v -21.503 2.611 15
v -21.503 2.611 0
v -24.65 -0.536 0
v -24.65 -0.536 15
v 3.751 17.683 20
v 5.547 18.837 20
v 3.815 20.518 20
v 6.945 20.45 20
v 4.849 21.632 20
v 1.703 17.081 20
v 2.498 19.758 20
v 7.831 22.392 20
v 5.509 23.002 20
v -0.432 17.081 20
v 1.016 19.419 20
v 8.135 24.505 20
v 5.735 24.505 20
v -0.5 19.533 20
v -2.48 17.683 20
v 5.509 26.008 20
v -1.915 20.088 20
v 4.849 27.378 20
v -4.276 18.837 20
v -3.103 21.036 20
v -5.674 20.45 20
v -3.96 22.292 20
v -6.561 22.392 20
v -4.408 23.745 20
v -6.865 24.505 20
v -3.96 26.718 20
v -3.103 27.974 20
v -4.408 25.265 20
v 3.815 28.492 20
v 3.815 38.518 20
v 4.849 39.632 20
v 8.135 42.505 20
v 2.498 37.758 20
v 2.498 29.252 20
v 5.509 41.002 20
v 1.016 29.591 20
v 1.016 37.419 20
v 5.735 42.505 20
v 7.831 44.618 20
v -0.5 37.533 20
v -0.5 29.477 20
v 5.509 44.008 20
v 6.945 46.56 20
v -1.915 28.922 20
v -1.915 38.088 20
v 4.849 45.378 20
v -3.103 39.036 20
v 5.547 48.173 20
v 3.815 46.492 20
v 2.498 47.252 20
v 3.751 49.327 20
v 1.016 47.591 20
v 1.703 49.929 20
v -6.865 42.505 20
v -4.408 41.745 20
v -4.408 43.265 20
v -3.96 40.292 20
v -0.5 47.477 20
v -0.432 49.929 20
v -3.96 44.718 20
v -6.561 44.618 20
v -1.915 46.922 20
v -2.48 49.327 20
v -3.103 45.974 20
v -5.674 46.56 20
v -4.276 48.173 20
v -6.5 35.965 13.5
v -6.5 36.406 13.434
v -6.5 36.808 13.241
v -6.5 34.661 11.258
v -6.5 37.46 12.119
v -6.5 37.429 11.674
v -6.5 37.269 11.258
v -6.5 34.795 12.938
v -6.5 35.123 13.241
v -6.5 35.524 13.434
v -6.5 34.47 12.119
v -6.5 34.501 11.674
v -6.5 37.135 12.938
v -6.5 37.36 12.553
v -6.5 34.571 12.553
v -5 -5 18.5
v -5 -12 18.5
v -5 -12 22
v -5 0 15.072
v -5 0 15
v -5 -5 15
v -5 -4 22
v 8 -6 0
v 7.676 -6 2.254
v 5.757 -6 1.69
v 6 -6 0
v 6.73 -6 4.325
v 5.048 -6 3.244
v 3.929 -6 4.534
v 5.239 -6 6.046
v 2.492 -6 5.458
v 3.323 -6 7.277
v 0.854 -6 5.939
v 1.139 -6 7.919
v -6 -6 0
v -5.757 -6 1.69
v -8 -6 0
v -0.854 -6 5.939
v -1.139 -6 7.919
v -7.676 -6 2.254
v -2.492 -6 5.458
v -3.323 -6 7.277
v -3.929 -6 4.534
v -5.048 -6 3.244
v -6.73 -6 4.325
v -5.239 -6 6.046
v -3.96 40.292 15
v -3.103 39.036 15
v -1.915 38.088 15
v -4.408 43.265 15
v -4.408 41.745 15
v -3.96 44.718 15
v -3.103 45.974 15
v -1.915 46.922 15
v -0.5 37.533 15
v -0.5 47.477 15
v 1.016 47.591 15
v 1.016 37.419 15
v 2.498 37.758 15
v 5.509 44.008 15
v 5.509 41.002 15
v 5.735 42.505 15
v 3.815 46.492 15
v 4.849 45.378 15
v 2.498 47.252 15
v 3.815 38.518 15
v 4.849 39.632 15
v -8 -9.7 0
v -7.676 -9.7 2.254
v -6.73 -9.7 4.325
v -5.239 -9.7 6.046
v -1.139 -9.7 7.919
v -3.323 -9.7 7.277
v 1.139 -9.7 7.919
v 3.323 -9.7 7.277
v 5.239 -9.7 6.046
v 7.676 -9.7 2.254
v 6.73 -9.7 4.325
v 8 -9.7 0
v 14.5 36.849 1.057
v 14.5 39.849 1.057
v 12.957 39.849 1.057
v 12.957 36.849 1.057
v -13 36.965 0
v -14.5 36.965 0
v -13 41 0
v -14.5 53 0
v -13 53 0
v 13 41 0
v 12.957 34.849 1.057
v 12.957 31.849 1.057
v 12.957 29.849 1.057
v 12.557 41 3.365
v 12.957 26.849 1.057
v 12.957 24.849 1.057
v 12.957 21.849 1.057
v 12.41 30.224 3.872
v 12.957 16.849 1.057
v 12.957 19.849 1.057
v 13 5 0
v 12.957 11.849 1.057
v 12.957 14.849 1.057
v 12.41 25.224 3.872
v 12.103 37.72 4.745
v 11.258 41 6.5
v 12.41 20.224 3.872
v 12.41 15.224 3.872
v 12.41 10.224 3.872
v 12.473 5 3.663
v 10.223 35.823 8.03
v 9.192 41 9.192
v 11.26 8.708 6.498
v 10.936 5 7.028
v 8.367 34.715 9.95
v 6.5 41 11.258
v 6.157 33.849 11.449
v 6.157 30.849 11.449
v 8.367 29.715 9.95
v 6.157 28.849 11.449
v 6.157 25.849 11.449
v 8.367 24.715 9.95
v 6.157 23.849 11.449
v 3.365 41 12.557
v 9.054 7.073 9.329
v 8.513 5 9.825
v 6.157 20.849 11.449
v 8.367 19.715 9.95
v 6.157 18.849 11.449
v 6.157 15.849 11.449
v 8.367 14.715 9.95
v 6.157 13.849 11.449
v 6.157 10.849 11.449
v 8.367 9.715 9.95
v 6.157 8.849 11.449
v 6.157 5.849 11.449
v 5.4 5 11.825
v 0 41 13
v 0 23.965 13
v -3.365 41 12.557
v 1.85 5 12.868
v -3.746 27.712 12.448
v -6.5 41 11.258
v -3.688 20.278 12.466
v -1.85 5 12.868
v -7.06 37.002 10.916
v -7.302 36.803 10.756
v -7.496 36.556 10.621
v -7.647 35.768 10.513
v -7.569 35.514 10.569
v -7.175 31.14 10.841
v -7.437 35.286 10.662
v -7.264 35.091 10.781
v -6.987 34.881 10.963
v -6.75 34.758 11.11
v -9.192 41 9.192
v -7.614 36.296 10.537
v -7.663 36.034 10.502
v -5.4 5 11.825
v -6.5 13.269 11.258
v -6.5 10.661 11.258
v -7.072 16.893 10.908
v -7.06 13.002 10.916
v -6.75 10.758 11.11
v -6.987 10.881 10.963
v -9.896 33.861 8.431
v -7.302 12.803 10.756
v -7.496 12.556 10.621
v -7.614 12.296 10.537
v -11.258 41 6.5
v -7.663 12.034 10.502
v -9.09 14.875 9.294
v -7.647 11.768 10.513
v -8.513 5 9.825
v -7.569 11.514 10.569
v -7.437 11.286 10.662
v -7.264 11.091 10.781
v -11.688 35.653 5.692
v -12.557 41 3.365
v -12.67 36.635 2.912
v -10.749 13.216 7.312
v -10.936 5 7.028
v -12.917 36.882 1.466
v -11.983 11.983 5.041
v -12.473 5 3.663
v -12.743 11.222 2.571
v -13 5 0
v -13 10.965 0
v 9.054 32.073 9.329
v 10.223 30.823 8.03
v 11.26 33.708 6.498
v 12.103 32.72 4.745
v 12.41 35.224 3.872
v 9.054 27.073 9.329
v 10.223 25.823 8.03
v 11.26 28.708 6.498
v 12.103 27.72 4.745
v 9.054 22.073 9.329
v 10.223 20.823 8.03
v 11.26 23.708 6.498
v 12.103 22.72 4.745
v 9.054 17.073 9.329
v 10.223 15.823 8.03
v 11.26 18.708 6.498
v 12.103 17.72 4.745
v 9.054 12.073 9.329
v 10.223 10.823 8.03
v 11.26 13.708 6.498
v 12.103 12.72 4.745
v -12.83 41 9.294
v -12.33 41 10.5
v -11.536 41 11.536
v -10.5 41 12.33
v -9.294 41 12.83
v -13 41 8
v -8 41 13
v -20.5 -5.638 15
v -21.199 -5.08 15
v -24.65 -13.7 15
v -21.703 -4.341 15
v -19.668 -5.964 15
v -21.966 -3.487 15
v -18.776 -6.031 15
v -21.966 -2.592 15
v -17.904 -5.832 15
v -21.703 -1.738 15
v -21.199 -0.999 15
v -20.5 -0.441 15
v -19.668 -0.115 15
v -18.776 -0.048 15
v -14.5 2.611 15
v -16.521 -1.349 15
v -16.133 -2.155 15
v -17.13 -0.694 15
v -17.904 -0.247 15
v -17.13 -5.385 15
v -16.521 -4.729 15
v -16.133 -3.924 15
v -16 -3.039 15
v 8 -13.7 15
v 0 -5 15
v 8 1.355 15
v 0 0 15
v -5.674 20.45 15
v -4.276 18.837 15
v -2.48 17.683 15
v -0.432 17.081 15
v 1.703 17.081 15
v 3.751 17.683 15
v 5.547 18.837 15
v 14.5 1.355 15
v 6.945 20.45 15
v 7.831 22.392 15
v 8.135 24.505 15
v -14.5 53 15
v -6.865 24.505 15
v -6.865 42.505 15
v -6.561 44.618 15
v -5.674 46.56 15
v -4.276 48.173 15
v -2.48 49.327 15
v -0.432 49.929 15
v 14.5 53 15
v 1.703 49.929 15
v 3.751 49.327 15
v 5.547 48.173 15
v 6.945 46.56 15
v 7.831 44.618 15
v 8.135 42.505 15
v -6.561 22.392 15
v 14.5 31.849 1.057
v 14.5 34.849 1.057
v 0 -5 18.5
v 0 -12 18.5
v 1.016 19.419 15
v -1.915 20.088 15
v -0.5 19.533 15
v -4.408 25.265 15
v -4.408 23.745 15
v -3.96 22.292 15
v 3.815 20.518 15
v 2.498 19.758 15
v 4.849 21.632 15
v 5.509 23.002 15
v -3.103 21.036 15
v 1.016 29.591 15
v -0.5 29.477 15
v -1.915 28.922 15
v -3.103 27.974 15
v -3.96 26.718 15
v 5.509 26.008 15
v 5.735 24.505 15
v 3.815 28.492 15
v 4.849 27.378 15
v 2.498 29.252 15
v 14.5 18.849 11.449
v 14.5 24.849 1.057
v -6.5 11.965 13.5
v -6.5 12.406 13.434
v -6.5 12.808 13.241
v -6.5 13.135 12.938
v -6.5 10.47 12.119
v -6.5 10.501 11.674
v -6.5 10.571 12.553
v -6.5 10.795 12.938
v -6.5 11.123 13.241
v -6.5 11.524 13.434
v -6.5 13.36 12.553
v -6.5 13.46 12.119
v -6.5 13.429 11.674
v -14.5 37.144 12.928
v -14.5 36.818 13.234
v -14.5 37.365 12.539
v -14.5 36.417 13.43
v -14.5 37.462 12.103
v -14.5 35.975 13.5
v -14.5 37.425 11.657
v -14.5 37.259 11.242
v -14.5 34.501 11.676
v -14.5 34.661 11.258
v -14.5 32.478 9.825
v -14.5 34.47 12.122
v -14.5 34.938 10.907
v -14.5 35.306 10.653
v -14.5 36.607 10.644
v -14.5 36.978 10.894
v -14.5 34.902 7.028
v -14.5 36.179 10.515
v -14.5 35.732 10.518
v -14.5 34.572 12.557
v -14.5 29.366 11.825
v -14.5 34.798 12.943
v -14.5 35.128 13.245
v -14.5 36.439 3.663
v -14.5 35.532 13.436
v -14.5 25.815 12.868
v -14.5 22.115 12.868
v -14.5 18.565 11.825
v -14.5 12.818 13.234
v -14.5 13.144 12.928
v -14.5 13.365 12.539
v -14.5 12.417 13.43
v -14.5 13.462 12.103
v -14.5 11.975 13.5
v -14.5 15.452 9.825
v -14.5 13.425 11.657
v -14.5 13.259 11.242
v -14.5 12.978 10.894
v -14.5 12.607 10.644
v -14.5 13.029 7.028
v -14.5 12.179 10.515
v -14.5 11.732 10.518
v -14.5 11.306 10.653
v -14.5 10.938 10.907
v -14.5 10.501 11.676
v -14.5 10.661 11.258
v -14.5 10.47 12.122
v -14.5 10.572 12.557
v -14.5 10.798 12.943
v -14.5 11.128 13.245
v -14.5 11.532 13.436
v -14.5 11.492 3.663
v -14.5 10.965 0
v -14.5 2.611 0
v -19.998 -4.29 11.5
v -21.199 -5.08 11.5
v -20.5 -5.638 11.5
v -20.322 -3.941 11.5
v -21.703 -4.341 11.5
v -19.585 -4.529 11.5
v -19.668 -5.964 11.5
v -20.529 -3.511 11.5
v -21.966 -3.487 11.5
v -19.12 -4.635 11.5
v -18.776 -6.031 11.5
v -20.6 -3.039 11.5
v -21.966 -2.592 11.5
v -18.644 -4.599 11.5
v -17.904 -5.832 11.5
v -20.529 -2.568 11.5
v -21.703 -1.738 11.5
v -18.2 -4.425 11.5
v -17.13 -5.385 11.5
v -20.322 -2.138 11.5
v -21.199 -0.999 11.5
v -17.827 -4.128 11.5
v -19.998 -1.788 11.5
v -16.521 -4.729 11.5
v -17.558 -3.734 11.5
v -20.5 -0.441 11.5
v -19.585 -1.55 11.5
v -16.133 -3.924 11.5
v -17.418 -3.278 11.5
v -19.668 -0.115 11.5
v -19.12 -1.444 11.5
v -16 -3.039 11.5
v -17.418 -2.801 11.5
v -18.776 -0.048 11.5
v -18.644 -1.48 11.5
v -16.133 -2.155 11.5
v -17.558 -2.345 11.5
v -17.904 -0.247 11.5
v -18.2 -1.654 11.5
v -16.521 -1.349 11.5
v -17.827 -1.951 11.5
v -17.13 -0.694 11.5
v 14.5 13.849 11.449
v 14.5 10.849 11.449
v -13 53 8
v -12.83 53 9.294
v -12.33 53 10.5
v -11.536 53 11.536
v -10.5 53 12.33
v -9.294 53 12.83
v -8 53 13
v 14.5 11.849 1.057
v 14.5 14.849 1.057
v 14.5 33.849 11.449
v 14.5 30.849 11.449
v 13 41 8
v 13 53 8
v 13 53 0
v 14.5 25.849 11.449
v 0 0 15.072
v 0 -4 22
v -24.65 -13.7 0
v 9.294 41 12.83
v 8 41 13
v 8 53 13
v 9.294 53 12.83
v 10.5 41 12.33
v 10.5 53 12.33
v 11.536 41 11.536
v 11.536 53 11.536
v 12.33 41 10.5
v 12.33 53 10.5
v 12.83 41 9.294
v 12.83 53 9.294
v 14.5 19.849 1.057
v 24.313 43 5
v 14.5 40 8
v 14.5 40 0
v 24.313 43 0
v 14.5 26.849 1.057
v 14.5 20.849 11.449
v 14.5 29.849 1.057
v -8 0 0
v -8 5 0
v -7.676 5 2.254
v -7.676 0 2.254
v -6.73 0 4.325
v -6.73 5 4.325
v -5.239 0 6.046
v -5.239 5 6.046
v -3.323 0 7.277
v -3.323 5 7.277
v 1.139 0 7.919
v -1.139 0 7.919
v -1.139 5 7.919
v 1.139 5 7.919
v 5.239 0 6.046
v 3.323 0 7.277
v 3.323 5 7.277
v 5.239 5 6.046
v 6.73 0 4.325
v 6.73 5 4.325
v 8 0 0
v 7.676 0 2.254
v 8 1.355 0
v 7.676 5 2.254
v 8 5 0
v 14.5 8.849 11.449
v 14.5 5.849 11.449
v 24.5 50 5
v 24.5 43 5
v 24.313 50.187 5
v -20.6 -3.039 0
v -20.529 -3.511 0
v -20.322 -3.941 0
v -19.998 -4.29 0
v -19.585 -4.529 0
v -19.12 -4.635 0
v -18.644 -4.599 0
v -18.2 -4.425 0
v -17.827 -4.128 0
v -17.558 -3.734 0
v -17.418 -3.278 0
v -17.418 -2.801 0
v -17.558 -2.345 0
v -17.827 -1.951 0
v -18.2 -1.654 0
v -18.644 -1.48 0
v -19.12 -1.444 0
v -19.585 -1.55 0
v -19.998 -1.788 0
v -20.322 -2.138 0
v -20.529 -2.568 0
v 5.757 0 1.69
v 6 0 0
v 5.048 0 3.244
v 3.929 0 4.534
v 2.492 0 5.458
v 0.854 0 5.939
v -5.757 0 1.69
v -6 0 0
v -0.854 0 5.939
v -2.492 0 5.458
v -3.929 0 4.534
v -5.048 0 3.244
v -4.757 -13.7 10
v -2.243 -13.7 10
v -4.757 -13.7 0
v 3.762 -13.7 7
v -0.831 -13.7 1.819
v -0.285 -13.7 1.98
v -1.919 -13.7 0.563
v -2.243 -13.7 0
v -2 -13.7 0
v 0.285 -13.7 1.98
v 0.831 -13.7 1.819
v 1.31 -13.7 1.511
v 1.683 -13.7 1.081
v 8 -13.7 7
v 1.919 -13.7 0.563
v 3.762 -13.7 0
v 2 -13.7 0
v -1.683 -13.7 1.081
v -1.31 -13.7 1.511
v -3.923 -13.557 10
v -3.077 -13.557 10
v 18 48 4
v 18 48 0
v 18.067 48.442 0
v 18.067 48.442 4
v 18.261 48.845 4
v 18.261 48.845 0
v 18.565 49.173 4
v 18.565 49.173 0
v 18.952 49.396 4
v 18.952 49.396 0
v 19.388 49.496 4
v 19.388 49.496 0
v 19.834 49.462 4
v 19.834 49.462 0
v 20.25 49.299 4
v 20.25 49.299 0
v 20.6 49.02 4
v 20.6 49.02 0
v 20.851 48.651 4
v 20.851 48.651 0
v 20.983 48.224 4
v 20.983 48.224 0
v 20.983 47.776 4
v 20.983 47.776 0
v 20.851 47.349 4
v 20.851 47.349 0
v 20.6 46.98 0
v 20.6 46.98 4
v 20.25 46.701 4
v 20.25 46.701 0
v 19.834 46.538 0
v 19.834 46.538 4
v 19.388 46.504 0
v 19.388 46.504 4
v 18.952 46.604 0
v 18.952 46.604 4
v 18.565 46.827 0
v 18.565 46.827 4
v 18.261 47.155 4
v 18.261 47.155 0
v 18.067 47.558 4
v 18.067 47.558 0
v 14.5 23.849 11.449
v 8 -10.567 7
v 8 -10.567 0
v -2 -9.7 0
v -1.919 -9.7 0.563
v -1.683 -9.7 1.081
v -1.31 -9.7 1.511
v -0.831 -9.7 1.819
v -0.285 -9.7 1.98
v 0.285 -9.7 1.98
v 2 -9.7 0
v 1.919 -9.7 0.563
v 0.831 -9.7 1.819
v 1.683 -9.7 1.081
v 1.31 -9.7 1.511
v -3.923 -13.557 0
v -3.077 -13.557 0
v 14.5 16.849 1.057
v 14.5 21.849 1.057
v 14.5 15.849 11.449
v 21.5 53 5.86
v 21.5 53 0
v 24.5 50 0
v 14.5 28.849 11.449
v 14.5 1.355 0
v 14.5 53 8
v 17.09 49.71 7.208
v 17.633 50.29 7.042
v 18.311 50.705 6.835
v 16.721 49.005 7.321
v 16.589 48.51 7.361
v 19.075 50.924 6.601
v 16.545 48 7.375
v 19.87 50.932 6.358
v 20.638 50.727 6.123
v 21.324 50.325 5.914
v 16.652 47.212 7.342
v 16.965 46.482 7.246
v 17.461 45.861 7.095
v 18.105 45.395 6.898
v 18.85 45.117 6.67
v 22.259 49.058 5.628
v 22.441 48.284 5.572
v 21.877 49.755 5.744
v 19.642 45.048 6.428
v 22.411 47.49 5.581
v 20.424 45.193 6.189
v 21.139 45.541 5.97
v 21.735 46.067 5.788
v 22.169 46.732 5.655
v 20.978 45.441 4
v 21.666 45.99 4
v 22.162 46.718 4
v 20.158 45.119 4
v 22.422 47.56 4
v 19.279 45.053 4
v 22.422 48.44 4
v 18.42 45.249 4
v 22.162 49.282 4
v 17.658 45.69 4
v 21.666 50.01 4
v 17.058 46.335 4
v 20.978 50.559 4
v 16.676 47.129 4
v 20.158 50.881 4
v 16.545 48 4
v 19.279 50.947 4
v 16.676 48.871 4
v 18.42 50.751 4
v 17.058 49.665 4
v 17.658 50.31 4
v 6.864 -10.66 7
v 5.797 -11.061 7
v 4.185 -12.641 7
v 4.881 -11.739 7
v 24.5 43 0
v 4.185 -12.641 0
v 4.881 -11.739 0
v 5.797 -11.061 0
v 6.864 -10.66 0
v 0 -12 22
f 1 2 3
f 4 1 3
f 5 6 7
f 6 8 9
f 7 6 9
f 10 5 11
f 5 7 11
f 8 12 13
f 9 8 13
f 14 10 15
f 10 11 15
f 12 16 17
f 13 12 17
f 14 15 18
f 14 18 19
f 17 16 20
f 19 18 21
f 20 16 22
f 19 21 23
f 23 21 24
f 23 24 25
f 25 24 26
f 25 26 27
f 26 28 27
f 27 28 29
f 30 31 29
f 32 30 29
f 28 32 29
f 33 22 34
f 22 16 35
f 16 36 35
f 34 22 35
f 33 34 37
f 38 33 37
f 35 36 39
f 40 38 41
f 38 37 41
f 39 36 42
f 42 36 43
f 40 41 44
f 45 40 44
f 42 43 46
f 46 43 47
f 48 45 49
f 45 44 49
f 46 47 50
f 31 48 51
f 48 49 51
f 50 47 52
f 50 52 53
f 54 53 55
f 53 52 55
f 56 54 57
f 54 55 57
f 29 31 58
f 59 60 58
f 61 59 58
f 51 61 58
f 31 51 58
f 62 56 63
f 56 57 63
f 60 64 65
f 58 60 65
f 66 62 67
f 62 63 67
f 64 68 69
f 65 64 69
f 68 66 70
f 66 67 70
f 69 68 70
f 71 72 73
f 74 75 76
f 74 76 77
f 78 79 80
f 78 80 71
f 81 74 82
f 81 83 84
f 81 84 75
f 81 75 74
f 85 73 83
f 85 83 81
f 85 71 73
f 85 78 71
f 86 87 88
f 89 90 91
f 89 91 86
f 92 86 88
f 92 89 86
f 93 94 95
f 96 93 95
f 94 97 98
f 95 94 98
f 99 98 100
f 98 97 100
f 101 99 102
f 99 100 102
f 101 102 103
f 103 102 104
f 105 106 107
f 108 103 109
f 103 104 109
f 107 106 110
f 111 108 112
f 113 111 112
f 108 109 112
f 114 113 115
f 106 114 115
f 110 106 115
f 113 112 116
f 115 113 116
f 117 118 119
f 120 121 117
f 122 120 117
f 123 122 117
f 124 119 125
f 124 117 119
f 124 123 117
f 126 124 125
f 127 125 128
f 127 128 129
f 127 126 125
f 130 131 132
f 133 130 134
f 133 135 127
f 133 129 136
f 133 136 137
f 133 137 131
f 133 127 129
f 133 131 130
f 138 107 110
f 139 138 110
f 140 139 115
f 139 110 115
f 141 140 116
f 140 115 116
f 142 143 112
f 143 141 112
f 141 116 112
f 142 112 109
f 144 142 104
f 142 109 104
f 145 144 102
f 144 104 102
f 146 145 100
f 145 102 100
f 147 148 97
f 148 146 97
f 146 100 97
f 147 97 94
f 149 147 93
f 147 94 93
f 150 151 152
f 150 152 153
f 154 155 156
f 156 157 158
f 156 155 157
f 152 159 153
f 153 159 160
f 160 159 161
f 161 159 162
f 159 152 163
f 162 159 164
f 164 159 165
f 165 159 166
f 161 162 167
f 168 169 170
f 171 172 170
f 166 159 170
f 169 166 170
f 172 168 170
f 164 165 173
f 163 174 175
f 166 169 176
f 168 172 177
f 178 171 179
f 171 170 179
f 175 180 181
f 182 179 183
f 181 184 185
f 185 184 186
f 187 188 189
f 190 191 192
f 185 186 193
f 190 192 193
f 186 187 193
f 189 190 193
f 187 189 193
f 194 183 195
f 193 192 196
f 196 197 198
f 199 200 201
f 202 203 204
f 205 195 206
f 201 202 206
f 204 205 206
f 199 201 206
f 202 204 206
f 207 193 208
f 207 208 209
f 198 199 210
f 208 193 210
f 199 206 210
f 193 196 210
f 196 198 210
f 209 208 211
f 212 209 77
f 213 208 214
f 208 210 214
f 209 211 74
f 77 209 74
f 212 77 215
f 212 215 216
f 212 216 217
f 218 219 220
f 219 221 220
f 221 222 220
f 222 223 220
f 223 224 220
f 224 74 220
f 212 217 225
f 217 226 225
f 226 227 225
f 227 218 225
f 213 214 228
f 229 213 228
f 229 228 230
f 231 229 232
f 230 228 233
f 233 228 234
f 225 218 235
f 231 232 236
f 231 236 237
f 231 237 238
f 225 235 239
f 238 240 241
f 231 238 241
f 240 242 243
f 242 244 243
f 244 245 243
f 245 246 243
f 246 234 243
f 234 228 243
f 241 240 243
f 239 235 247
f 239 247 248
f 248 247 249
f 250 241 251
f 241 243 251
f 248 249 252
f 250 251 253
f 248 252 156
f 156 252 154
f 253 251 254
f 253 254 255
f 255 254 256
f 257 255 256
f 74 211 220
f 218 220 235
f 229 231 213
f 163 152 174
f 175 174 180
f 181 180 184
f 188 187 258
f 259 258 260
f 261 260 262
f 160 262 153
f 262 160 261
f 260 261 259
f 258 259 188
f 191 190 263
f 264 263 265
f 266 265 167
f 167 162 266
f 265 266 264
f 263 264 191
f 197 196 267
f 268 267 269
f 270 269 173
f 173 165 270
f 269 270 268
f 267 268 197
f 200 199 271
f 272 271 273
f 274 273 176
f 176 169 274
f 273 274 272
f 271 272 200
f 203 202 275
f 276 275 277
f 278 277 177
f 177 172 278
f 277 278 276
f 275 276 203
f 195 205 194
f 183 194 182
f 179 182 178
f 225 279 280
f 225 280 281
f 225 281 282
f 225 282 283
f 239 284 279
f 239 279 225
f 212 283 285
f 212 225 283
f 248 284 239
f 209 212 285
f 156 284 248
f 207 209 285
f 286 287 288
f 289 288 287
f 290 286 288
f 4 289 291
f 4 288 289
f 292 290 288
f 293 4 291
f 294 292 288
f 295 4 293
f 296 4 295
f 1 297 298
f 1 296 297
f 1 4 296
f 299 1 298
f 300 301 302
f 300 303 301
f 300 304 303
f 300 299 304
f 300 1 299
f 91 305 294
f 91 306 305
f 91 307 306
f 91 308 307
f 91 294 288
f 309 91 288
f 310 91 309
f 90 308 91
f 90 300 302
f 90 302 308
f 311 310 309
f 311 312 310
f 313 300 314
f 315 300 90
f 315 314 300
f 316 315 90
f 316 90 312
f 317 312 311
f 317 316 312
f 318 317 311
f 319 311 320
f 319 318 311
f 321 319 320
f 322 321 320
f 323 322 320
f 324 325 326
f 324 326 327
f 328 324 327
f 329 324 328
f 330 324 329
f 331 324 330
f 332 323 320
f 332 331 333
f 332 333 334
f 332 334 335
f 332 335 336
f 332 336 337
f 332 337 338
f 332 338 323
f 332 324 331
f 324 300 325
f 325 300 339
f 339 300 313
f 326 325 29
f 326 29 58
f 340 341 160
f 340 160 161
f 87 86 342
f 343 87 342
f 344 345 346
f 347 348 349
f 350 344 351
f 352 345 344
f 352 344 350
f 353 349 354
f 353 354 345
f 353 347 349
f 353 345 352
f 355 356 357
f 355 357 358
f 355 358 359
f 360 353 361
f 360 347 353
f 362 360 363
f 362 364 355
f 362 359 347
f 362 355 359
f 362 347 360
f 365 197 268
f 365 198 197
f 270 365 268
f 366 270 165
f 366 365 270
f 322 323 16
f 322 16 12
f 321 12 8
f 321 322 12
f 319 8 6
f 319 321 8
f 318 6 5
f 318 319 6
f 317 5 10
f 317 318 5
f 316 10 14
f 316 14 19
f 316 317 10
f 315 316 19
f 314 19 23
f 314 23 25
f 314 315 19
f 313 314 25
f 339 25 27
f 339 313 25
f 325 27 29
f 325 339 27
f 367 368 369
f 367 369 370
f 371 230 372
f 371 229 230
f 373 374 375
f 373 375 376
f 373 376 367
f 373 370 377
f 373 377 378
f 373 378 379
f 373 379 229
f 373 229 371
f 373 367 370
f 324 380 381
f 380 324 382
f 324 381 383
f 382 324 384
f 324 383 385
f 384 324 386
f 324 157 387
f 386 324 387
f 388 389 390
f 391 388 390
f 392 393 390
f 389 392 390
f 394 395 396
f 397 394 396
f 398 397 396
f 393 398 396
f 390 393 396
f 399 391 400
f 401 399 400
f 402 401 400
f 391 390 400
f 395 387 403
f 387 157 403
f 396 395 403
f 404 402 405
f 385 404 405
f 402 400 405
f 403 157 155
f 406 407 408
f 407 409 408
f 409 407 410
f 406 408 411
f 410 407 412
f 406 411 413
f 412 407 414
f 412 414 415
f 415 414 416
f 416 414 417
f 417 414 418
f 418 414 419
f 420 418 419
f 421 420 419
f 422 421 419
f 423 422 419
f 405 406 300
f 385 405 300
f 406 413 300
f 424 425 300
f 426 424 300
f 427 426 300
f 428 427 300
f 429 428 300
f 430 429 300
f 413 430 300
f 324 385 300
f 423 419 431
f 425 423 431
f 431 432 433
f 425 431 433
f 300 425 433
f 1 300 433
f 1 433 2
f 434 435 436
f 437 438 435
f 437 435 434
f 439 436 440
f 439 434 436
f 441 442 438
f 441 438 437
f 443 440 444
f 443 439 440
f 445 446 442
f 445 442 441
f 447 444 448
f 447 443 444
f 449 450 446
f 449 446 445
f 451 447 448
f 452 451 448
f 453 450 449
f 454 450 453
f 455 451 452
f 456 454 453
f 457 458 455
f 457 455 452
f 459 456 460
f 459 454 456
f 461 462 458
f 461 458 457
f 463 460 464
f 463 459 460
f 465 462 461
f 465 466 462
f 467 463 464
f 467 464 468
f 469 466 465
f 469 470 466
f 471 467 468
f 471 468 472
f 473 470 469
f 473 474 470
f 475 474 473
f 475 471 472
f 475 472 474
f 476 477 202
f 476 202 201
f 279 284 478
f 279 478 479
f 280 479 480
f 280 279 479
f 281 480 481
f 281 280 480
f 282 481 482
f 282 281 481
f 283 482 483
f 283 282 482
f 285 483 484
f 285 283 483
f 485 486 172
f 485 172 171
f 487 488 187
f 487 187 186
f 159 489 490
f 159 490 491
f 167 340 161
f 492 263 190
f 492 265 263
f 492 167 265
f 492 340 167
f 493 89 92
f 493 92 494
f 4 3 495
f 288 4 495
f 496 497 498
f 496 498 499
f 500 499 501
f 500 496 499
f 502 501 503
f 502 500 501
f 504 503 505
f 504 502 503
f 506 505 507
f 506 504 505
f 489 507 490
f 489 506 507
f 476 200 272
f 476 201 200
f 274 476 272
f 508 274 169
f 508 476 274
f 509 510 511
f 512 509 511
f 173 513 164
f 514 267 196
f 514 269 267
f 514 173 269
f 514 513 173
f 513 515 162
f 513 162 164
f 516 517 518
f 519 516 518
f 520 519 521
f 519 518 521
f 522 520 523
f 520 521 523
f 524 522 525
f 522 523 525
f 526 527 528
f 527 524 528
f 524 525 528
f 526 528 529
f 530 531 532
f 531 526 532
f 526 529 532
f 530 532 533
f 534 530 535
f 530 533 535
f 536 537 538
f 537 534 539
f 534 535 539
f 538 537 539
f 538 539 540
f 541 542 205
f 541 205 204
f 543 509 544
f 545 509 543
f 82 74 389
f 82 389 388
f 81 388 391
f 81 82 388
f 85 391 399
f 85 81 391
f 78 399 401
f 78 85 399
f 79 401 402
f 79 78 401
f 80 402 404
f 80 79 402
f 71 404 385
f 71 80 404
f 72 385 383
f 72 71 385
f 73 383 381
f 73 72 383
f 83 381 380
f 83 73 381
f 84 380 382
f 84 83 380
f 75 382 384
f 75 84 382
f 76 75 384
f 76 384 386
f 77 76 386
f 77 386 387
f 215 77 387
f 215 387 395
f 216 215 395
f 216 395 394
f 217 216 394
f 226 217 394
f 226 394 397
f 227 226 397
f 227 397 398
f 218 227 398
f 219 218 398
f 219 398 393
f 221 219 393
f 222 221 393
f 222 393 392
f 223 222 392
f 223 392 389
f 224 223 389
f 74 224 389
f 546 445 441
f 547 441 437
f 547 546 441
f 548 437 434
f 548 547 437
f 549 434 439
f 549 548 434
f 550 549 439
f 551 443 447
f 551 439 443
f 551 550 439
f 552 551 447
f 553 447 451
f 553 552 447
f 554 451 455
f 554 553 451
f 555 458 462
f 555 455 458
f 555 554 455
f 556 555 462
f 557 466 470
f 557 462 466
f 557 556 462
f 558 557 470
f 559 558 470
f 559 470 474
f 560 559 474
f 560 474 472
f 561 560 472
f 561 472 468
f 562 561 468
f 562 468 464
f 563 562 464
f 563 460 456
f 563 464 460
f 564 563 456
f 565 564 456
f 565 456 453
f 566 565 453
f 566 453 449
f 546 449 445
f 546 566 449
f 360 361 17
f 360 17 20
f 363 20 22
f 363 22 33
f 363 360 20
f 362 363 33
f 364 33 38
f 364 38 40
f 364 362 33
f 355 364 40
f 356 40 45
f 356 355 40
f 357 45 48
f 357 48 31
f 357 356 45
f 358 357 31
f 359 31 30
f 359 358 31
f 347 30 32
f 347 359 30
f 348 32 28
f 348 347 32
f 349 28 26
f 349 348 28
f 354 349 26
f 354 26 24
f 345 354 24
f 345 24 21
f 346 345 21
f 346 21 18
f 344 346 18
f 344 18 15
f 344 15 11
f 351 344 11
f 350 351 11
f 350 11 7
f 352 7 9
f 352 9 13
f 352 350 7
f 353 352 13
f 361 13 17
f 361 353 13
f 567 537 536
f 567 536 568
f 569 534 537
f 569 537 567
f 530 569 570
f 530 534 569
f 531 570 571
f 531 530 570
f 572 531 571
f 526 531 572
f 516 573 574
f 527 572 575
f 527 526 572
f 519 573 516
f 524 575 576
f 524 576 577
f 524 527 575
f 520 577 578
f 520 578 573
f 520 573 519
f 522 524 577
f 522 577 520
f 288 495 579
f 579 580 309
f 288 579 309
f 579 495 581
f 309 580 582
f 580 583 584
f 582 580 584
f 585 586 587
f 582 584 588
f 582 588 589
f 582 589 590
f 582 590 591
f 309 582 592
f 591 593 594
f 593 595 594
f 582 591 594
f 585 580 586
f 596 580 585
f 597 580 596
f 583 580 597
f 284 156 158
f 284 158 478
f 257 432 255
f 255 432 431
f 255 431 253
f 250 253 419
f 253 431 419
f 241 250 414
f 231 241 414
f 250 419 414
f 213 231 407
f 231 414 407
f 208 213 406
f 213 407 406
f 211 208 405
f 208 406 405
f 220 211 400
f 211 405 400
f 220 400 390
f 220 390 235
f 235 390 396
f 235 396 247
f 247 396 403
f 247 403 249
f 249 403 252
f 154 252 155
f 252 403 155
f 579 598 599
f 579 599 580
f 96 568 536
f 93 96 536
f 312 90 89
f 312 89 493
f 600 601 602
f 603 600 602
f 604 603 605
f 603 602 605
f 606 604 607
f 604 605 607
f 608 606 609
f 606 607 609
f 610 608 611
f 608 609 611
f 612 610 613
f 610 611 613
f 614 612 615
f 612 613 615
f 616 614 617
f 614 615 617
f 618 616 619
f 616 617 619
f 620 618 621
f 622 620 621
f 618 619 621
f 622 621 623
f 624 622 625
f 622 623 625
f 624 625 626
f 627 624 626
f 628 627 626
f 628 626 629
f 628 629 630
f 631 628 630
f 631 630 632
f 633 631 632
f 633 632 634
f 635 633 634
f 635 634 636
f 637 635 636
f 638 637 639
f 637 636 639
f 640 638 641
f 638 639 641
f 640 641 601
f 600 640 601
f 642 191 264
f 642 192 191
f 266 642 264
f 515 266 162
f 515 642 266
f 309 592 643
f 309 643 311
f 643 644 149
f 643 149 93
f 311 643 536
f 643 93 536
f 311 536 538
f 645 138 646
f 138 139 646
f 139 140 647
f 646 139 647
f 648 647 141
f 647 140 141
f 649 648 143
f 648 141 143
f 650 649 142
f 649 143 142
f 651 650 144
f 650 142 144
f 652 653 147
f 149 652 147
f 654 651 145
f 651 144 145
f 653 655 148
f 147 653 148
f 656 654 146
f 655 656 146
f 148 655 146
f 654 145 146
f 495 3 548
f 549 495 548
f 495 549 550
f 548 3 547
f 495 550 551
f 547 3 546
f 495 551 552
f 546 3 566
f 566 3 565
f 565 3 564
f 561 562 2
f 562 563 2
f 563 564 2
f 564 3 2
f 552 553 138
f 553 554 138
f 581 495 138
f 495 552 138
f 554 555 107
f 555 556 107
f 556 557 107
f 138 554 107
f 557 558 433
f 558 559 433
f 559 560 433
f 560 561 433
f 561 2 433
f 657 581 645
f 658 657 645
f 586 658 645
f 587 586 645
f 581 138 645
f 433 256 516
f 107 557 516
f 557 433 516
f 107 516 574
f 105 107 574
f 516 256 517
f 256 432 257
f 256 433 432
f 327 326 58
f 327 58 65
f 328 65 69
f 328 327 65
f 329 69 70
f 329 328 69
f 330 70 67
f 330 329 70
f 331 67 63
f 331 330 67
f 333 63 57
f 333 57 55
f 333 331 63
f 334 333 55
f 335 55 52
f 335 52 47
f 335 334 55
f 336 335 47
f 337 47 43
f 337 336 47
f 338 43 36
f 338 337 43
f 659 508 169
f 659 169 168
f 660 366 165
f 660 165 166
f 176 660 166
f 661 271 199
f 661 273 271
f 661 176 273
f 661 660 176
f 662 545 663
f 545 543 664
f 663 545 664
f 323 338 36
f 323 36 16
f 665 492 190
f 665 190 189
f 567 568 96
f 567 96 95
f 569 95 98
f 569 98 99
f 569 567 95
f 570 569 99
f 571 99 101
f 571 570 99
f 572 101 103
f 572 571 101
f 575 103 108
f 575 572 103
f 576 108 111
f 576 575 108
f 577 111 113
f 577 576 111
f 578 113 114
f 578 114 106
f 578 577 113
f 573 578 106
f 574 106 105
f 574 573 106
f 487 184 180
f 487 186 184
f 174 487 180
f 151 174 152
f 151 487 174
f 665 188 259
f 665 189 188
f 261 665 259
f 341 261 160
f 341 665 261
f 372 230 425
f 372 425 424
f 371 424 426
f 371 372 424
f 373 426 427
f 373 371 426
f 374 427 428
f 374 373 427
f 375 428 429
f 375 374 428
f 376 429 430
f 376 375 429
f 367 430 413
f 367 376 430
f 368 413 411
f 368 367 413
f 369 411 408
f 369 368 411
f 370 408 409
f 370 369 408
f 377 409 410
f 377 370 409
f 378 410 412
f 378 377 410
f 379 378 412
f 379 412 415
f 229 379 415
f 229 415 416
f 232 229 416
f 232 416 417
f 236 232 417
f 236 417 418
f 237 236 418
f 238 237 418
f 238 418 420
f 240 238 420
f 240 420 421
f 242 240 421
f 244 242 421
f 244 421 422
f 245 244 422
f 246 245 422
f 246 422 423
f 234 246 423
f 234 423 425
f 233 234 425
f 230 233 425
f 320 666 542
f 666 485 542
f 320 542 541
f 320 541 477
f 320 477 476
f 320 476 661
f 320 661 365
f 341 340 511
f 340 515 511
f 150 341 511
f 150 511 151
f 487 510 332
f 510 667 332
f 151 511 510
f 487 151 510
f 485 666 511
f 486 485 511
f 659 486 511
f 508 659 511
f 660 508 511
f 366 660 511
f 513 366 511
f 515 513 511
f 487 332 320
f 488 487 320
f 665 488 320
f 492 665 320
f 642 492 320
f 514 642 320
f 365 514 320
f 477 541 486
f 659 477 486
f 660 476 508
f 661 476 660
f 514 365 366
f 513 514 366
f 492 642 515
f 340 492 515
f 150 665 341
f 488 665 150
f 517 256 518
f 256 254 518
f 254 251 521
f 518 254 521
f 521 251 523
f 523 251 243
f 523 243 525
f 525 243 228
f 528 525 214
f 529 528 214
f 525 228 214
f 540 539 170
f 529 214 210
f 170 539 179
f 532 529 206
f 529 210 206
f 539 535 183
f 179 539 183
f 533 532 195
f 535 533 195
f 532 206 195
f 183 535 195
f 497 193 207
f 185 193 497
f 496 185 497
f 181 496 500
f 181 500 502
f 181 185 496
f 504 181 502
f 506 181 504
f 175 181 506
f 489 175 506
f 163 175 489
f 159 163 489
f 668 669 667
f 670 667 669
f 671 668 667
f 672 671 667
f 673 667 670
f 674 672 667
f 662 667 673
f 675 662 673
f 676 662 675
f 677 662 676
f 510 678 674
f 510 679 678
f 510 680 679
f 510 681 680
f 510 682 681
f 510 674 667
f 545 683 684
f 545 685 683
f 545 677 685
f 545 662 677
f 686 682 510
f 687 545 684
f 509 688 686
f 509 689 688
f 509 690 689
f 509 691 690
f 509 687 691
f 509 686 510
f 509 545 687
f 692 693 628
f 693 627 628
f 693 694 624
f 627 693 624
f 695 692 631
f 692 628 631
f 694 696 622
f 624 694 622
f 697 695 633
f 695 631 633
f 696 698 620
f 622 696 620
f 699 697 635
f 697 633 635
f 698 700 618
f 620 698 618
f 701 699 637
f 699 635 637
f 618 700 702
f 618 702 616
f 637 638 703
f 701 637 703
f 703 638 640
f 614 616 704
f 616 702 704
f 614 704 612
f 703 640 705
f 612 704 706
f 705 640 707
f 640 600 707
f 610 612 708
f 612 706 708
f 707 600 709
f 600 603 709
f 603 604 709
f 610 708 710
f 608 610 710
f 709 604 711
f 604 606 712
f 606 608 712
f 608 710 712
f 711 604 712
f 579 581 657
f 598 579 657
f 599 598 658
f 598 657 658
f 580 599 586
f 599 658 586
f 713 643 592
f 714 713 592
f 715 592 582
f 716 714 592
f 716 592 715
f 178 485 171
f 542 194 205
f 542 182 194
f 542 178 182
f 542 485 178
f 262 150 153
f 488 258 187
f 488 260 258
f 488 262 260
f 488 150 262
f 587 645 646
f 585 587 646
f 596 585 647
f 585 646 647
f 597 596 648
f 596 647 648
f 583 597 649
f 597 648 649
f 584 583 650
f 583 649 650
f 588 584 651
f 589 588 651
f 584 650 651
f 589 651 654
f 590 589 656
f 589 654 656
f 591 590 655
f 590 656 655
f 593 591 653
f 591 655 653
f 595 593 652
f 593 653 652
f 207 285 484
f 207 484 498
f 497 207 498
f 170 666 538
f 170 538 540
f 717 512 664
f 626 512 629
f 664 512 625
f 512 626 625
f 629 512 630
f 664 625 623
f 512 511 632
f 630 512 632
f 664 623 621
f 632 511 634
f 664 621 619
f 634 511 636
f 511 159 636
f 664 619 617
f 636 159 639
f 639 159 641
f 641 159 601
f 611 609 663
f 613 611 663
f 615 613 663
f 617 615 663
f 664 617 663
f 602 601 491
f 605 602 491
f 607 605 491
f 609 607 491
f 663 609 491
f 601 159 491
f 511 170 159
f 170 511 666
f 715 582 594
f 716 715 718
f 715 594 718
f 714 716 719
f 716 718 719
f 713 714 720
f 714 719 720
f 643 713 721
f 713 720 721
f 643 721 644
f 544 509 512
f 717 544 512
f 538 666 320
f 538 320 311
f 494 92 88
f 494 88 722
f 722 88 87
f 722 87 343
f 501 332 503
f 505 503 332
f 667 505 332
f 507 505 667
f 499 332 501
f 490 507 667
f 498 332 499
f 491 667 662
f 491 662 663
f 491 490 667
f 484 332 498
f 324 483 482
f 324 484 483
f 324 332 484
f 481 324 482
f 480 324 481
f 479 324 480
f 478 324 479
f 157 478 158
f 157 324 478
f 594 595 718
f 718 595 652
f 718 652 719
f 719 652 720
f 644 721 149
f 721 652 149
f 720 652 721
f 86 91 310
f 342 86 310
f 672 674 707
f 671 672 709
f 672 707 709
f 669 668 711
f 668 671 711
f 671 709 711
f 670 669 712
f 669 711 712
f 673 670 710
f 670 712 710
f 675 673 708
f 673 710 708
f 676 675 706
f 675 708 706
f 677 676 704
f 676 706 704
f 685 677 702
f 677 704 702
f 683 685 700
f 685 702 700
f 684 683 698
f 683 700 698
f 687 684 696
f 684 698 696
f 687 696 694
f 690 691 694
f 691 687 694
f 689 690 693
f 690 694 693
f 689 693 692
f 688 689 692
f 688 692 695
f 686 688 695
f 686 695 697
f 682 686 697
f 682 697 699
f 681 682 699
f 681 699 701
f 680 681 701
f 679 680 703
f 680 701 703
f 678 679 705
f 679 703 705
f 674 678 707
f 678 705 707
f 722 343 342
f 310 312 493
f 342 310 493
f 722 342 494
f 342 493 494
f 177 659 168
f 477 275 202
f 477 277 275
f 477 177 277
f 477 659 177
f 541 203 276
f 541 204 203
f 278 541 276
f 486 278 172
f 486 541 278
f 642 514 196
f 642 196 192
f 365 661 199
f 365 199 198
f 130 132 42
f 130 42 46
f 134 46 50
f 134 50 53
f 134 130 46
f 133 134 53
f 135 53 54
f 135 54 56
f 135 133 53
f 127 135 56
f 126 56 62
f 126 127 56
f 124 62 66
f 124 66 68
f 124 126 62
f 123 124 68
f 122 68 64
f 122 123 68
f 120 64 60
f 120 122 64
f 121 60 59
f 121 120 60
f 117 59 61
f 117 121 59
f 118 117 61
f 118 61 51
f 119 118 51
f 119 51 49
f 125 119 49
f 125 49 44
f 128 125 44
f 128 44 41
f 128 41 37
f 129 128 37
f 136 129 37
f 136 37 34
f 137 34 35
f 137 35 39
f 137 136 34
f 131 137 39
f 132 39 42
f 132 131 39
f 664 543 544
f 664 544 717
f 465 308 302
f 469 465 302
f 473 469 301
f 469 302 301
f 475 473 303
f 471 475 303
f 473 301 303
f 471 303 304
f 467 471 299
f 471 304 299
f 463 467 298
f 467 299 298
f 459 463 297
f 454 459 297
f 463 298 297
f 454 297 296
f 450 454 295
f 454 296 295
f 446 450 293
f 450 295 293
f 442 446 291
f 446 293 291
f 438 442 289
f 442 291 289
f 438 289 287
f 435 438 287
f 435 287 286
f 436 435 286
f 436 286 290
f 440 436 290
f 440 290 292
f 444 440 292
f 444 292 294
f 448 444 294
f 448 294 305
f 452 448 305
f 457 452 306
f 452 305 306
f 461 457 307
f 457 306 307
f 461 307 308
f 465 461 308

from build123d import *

# Parameters (mm, degrees)
P_IDAT_VYSUNUT_M1_DEPTH       = 6
P_IDAT_VYSUNUT_M2_DEPTH       = 4
P_IDAT_START                  = -18.7
P_IDAT_VYSUNUT_M3_DEPTH       = 18.7
P_IDAT_VYSUNUT_M4_DEPTH       = 36
P_IDAT_VYSUNUT_M5_DEPTH       = 12
P_IDAT_VYSUNUT_M6_DEPTH       = 18.7
SKICA10_W                     = 6.5
SKICA10_H                     = 16.04047294
ODEBRAT_VYSUNUT_M2_DEPTH      = 15
SKICA4_R                      = 4.125470306
ODEBRAT_VYSUNUT_M3_DEPTH      = 7
SKICA11_R                     = 1.6
P_IDAT_VYSUNUT_M7_DEPTH       = 15
SKICA12_R                     = 5
ODEBRAT_VYSUNUT_M4_DEPTH      = 10
SKICA13_R                     = 3
ODEBRAT_VYSUNUT_M5_DEPTH      = 3.5
ODEBRAT_VYSUNUT_M6_REACH      = 69.578
ODEBRAT_VYSUNUT_M6_END_RADIUS = 13
ODEBRAT_START                 = -8
SKICA15_R                     = 1.5
ODEBRAT_VYSUNUT_M7_DEPTH      = 8
ODEBRAT_VYSUNUT_M8_REACH      = 64.249
ODEBRAT_VYSUNUT_M8_END_RADIUS = 13
SKICA16_R                     = 13
SKICA17_W                     = 5
SKICA17_H                     = 10
P_IDAT_VYSUNUT_M8_DEPTH       = 10
ZKOSEN_1_SIZE                 = 3
ZKOSEN_1_SIZE2                = 9.812557855
ZKOSEN_2_SIZE                 = 3
ZKOSEN_2_SIZE2                = 9.812557855
SKICA18_R                     = 1.5
ODEBRAT_VYSUNUT_M9_DEPTH      = 4
SKICA19_R                     = 2.955100019
ODEBRAT_VYSUNUT_M10_DEPTH     = 4
ZKOSEN_3_SIZE                 = 3
SKICA20_W                     = 5
SKICA20_H                     = 5
P_IDAT_VYSUNUT_M9_DEPTH       = 7
SKICA21_W                     = 5
SKICA21_H                     = 3.5
P_IDAT_VYSUNUT_M10_DEPTH      = 7
ZKOSEN_4_SIZE                 = 4
ZKOSEN_4_SIZE2                = 6.92820323
SKICA22_R                     = 5.1
P_IDAT_VYSUNUT_M11_DEPTH      = 5


with BuildPart() as part:
    # Skica2 → Přidat vysunutím1 (new body)
    with BuildSketch(Plane.XZ):
        with BuildLine():
            Line((8, 0), (6, 0))
            ThreePointArc((6, 0), (0, 6), (-6, 0))
            Line((-6, 0), (-8, 0))
            ThreePointArc((-8, 0), (0, 8), (8, 0))
        make_face()
    extrude(amount=P_IDAT_VYSUNUT_M1_DEPTH)



with BuildPart() as body_2:
    # Skica3 → Přidat vysunutím2 (new body)
    with BuildSketch(Plane.XZ.offset(9.7)):
        with BuildLine():
            Line((4.5, 0), (8, 0))
            ThreePointArc((8, 0), (0, 8), (-8, 0))
            Line((-8, 0), (-4.5, 0))
            Line((-4.5, 0), (-2, 0))
            ThreePointArc((-2, 0), (0, 2), (2, 0))
            Line((2, 0), (4.5, 0))
        make_face()
    extrude(amount=P_IDAT_VYSUNUT_M2_DEPTH)


with BuildPart() as part_1:
    add(part.part)

    add(body_2.part)  # Přidat vysunutím3 merges body 2
    # Skica6 → Přidat vysunutím3 (add)
    with BuildSketch(Plane.XZ.offset(13.7).offset(P_IDAT_START)):
        with BuildLine():
            Line((-13, 0), (-8, 0))
            ThreePointArc((-8, 0), (0, 8), (8, 0))
            Line((8, 0), (13, 0))
            ThreePointArc((13, 0), (0, 13), (-13, 0))
        make_face()
    extrude(amount=P_IDAT_VYSUNUT_M3_DEPTH)



with BuildPart() as body_2_2:
    # Skica7 → Přidat vysunutím4 (new body)
    with BuildSketch(Plane(origin=(0, 5, 0), x_dir=(1, 0, 0), z_dir=(0, 1, 0))):
        with BuildLine():
            Line((-13, 0), (-14.5, 0))
            Line((-14.5, 0), (-14.5, -15))
            Line((-14.5, -15), (14.5, -15))
            Line((14.5, -15), (14.5, 0))
            Line((14.5, 0), (13, 0))
            ThreePointArc((13, 0), (0, -13), (-13, 0))
        make_face()
    extrude(amount=P_IDAT_VYSUNUT_M4_DEPTH)

    # Skica8 → Přidat vysunutím5 (add)
    with BuildSketch(Plane(origin=(0, 41, 0), x_dir=(1, 0, 0), z_dir=(0, 1, 0))):
        with BuildLine():
            Line((-14.5, 0), (-13, 0))
            Line((-13, 0), (-13, -8))
            ThreePointArc((-13, -8), (-11.535533906, -11.535533906), (-8, -13))
            Line((-8, -13), (8, -13))
            ThreePointArc((8, -13), (11.535533906, -11.535533906), (13, -8))
            Line((13, -8), (13, 0))
            Line((13, 0), (14.5, 0))
            Line((14.5, 0), (14.5, -15))
            Line((14.5, -15), (-14.5, -15))
            Line((-14.5, -15), (-14.5, 0))
        make_face()
    extrude(amount=P_IDAT_VYSUNUT_M5_DEPTH)


with BuildPart() as part_2:
    add(part_1.part)

    add(body_2_2.part)  # Přidat vysunutím6 merges body 2 2
    # Skica9 → Přidat vysunutím6 (add)
    with BuildSketch(Plane.XZ.offset(-5)):
        with BuildLine():
            Line((13, 0), (14.5, 0))
            Line((14.5, 0), (14.5, 15))
            Line((14.5, 15), (-14.5, 15))
            Line((-14.5, 15), (-14.5, 0))
            Line((-14.5, 0), (-13, 0))
            ThreePointArc((-13, 0), (0, 13), (13, 0))
        make_face()
    extrude(amount=P_IDAT_VYSUNUT_M6_DEPTH)

    # Skica10 → Odebrat vysunutím2 (cut)
    with BuildSketch(Plane(origin=(0, 0, 0), x_dir=(-1, 0, 0), z_dir=(0, 0, -1))):
        with Locations((-11.25, -6.665379435)):
            Rectangle(SKICA10_W, SKICA10_H)
    extrude(amount=-ODEBRAT_VYSUNUT_M2_DEPTH, mode=Mode.SUBTRACT)

    # Skica4 → Odebrat vysunutím3 (cut)
    with BuildSketch(Plane(origin=(0, 0, 0), x_dir=(-1, 0, 0), z_dir=(0, 0, -1))):
        with Locations((-7.768024839, -14.685615905)):
            Circle(SKICA4_R)
    extrude(amount=-ODEBRAT_VYSUNUT_M3_DEPTH, mode=Mode.SUBTRACT)

    # Skica11 → Přidat vysunutím7 (add)
    with BuildSketch(Plane.XY):
        with BuildLine():
            Line((-24.65, -13.7), (-14.5, -13.7))
            Line((-14.5, -13.7), (-4.756948598, -13.7))
            ThreePointArc((-4.756948598, -13.7), (-3.5, -13.539429741), (-2.243051402, -13.7))
            Line((-2.243051402, -13.7), (-2, -13.7))
            Line((-2, -13.7), (-2, -9.7))
            Line((-2, -9.7), (-8, -9.7))
            Line((-8, -9.7), (-8, -6))
            Line((-8, -6), (-6, -6))
            Line((-6, -6), (-6, 0))
            Line((-6, 0), (-8, 0))
            Line((-8, 0), (-8, 5))
            Line((-8, 5), (-13, 5))
            Line((-13, 5), (-13, 10.965216354))
            Line((-13, 10.965216354), (-14.5, 10.965216354))
            Line((-14.5, 10.965216354), (-14.5, 2.610570259))
            Line((-14.5, 2.610570259), (-21.503374824, 2.610570259))
            Line((-21.503374824, 2.610570259), (-24.65, -0.536054918))
            Line((-24.65, -0.536054918), (-24.65, -13.7))
        make_face()
        with Locations(Location((-19, -3.039429741, 0), (0, 0, 180))):
            Circle(SKICA11_R, mode=Mode.SUBTRACT)
    extrude(amount=P_IDAT_VYSUNUT_M7_DEPTH)

    # Skica12 → Odebrat vysunutím4 (cut)
    with BuildSketch(Plane(origin=(0, 0, 0), x_dir=(-1, 0, 0), z_dir=(0, 0, -1))):
        with Locations((3.5, -18.539429741)):
            Circle(SKICA12_R)
    extrude(amount=-ODEBRAT_VYSUNUT_M4_DEPTH, mode=Mode.SUBTRACT)

    # Skica13 → Odebrat vysunutím5 (cut)
    with BuildSketch(Plane.XY.offset(15)):
        with Locations((-19, -3.039429741)):
            Circle(SKICA13_R)
    extrude(amount=-ODEBRAT_VYSUNUT_M5_DEPTH, mode=Mode.SUBTRACT)

    # Odebrat vysunutím6: up to this cylinder (the profile starts outside it)
    odebrat_vysunut_m6_end = Plane(origin=(0, 22.848748, 0), z_dir=(0, -1, 0)) * Cylinder(ODEBRAT_VYSUNUT_M6_END_RADIUS, 191.156, mode=Mode.PRIVATE)
    # Skica14 → Odebrat vysunutím6 (cut, up to the surface)
    with BuildSketch(Plane(origin=(14.5, 0, 0), x_dir=(0, 0, -1), z_dir=(1, 0, 0)), mode=Mode.PRIVATE) as odebrat_vysunut_m6_sk1:
        Polygon((-11.449426353, 13.848748302), (-1.057121507, 19.848748302), (-1.057121507, 16.848748302), (-11.449426353, 10.848748302), align=None)
    odebrat_vysunut_m6_tool1 = extrude(odebrat_vysunut_m6_sk1.sketch, amount=-ODEBRAT_VYSUNUT_M6_REACH, mode=Mode.PRIVATE) - odebrat_vysunut_m6_end
    add(odebrat_vysunut_m6_tool1.solids().sort_by_distance((14.5, 15.348748, 6.253274))[0], mode=Mode.SUBTRACT)
    # Skica14 → Odebrat vysunutím6 (cut, up to the surface)
    with BuildSketch(Plane(origin=(14.5, 0, 0), x_dir=(0, 0, -1), z_dir=(1, 0, 0)), mode=Mode.PRIVATE) as odebrat_vysunut_m6_sk2:
        Polygon((-11.449426353, 8.848748302), (-1.057121507, 14.848748302), (-1.057121507, 11.848748302), (-11.449426353, 5.848748302), align=None)
    odebrat_vysunut_m6_tool2 = extrude(odebrat_vysunut_m6_sk2.sketch, amount=-ODEBRAT_VYSUNUT_M6_REACH, mode=Mode.PRIVATE) - odebrat_vysunut_m6_end
    add(odebrat_vysunut_m6_tool2.solids().sort_by_distance((14.5, 10.348748, 6.253274))[0], mode=Mode.SUBTRACT)
    # Skica14 → Odebrat vysunutím6 (cut, up to the surface)
    with BuildSketch(Plane(origin=(14.5, 0, 0), x_dir=(0, 0, -1), z_dir=(1, 0, 0)), mode=Mode.PRIVATE) as odebrat_vysunut_m6_sk3:
        Polygon((-11.449426353, 18.848748302), (-1.057121507, 24.848748302), (-1.057121507, 21.848748302), (-11.449426353, 15.848748302), align=None)
    odebrat_vysunut_m6_tool3 = extrude(odebrat_vysunut_m6_sk3.sketch, amount=-ODEBRAT_VYSUNUT_M6_REACH, mode=Mode.PRIVATE) - odebrat_vysunut_m6_end
    add(odebrat_vysunut_m6_tool3.solids().sort_by_distance((14.5, 20.348748, 6.253274))[0], mode=Mode.SUBTRACT)
    # Skica14 → Odebrat vysunutím6 (cut, up to the surface)
    with BuildSketch(Plane(origin=(14.5, 0, 0), x_dir=(0, 0, -1), z_dir=(1, 0, 0)), mode=Mode.PRIVATE) as odebrat_vysunut_m6_sk4:
        Polygon((-11.449426353, 23.848748302), (-1.057121507, 29.848748302), (-1.057121507, 26.848748302), (-11.449426353, 20.848748302), align=None)
    odebrat_vysunut_m6_tool4 = extrude(odebrat_vysunut_m6_sk4.sketch, amount=-ODEBRAT_VYSUNUT_M6_REACH, mode=Mode.PRIVATE) - odebrat_vysunut_m6_end
    add(odebrat_vysunut_m6_tool4.solids().sort_by_distance((14.5, 25.348748, 6.253274))[0], mode=Mode.SUBTRACT)
    # Skica14 → Odebrat vysunutím6 (cut, up to the surface)
    with BuildSketch(Plane(origin=(14.5, 0, 0), x_dir=(0, 0, -1), z_dir=(1, 0, 0)), mode=Mode.PRIVATE) as odebrat_vysunut_m6_sk5:
        Polygon((-11.449426353, 28.848748302), (-1.057121507, 34.848748302), (-1.057121507, 31.848748302), (-11.449426353, 25.848748302), align=None)
    odebrat_vysunut_m6_tool5 = extrude(odebrat_vysunut_m6_sk5.sketch, amount=-ODEBRAT_VYSUNUT_M6_REACH, mode=Mode.PRIVATE) - odebrat_vysunut_m6_end
    add(odebrat_vysunut_m6_tool5.solids().sort_by_distance((14.5, 30.348748, 6.253274))[0], mode=Mode.SUBTRACT)
    # Skica14 → Odebrat vysunutím6 (cut, up to the surface)
    with BuildSketch(Plane(origin=(14.5, 0, 0), x_dir=(0, 0, -1), z_dir=(1, 0, 0)), mode=Mode.PRIVATE) as odebrat_vysunut_m6_sk6:
        Polygon((-11.449426353, 33.848748302), (-1.057121507, 39.848748302), (-1.057121507, 36.848748302), (-11.449426353, 30.848748302), align=None)
    odebrat_vysunut_m6_tool6 = extrude(odebrat_vysunut_m6_sk6.sketch, amount=-ODEBRAT_VYSUNUT_M6_REACH, mode=Mode.PRIVATE) - odebrat_vysunut_m6_end
    add(odebrat_vysunut_m6_tool6.solids().sort_by_distance((14.5, 35.348748, 6.253274))[0], mode=Mode.SUBTRACT)

    # Skica15 → Odebrat vysunutím7 (cut)
    with BuildSketch(Plane.ZY.offset(14.5).offset(ODEBRAT_START)):
        with Locations(Location((12, 35.965216354, 0), (0, 0, 240.366753373))):
            Circle(SKICA15_R)
        with Locations(Location((12, 11.965216354, 0), (0, 0, 240.366753373))):
            Circle(SKICA15_R)
    extrude(amount=ODEBRAT_VYSUNUT_M7_DEPTH, mode=Mode.SUBTRACT)

    # Odebrat vysunutím8: up to this cylinder (the profile starts outside it)
    odebrat_vysunut_m8_end = Plane(origin=(0, 23.965216, 0), z_dir=(0, -1, 0)) * Cylinder(ODEBRAT_VYSUNUT_M8_END_RADIUS, 155.498, mode=Mode.PRIVATE)
    # Skica16 → Odebrat vysunutím8 (cut, up to the surface)
    with BuildSketch(Plane.ZY.offset(14.5), mode=Mode.PRIVATE) as odebrat_vysunut_m8_sk1:
        with Locations((0, 23.965216354)):
            Circle(SKICA16_R)
    odebrat_vysunut_m8_tool1 = extrude(odebrat_vysunut_m8_sk1.sketch, amount=-ODEBRAT_VYSUNUT_M8_REACH, mode=Mode.PRIVATE) - odebrat_vysunut_m8_end
    add(odebrat_vysunut_m8_tool1.solids().sort_by_distance((-14.5, 23.965216, 0))[0], mode=Mode.SUBTRACT)

    # Skica17 → Přidat vysunutím8 (add)
    with BuildSketch(Plane(origin=(14.5, 0, 0), x_dir=(0, 0, -1), z_dir=(1, 0, 0))):
        with Locations((-2.5, 48)):
            Rectangle(SKICA17_W, SKICA17_H)
    extrude(amount=P_IDAT_VYSUNUT_M8_DEPTH)

    # Zkosení1
    zkosen_1_edges = [part_2.edges().sort_by_distance(p)[0] for p in [
        (14.5, 43, 2.5),
    ]]
    zkosen_1_side = [part_2.faces().sort_by_distance(p)[0] for p in [
        (14.5, 26.747010965, 8.398810193),
    ]]
    chamfer(zkosen_1_edges, length=ZKOSEN_1_SIZE, length2=ZKOSEN_1_SIZE2, reference=zkosen_1_side[0])

    # Zkosení2
    zkosen_2_edges = [part_2.edges().sort_by_distance(p)[0] for p in [
        (14.5, 46.5, 5),
    ]]
    zkosen_2_side = [part_2.faces().sort_by_distance(p)[0] for p in [
        (14.5, 26.323573909, 8.56811655),
    ]]
    chamfer(zkosen_2_edges, length=ZKOSEN_2_SIZE, length2=ZKOSEN_2_SIZE2, reference=zkosen_2_side[0])

    # Skica18 → Odebrat vysunutím9 (cut)
    with BuildSketch(Plane(origin=(0, 0, 0), x_dir=(-1, 0, 0), z_dir=(0, 0, -1))):
        with Locations((-19.5, 48)):
            Circle(SKICA18_R)
    extrude(amount=-ODEBRAT_VYSUNUT_M9_DEPTH, mode=Mode.SUBTRACT)

    # Skica19 → Odebrat vysunutím10 (cut)
    with BuildSketch(Plane(origin=(0, 0, 4), x_dir=(-1, 0, 0), z_dir=(0, 0, -1))):
        with Locations((-19.5, 48)):
            Circle(SKICA19_R)
    extrude(amount=-ODEBRAT_VYSUNUT_M10_DEPTH, mode=Mode.SUBTRACT)

    # Zkosení3
    zkosen_3_edges = [part_2.edges().sort_by_distance(p)[0] for p in [
        (24.5, 53, 2.5),
    ]]
    chamfer(zkosen_3_edges, length=ZKOSEN_3_SIZE)

    # Skica20 → Přidat vysunutím9 (add)
    with BuildSketch(Plane.XY.offset(15)):
        with Locations((-2.5, -2.5)):
            Rectangle(SKICA20_W, SKICA20_H)
    extrude(amount=P_IDAT_VYSUNUT_M9_DEPTH)

    # Skica21 → Přidat vysunutím10 (add)
    with BuildSketch(Plane.XZ.offset(5)):
        with Locations((-2.5, 20.25)):
            Rectangle(SKICA21_W, SKICA21_H)
    extrude(amount=P_IDAT_VYSUNUT_M10_DEPTH)

    # Zkosení4
    zkosen_4_edges = [part_2.edges().sort_by_distance(p)[0] for p in [
        (-2.5, 0, 22),
    ]]
    zkosen_4_side = [part_2.faces().sort_by_distance(p)[0] for p in [
        (-2.5, -6, 22),
    ]]
    chamfer(zkosen_4_edges, length=ZKOSEN_4_SIZE, length2=ZKOSEN_4_SIZE2, reference=zkosen_4_side[0])

    # Skica22 → Přidat vysunutím11 (add)
    with BuildSketch(Plane.XY.offset(15)):
        with BuildLine():
            Line((-6.864781882, 24.505037691), (-6.864781882, 42.505037691))
            ThreePointArc((-6.864781882, 42.505037691), (0.635218118, 50.005037691), (8.135218118, 42.505037691))
            Line((8.135218118, 42.505037691), (8.135218118, 24.505037691))
            ThreePointArc((8.135218118, 24.505037691), (0.635218118, 17.005037691), (-6.864781882, 24.505037691))
        make_face()
        with Locations((0.635218118, 42.505037691)):
            Circle(SKICA22_R, mode=Mode.SUBTRACT)
        with Locations((0.635218118, 24.505037691)):
            Circle(SKICA22_R, mode=Mode.SUBTRACT)
    extrude(amount=P_IDAT_VYSUNUT_M11_DEPTH)


solid = part_2.part
